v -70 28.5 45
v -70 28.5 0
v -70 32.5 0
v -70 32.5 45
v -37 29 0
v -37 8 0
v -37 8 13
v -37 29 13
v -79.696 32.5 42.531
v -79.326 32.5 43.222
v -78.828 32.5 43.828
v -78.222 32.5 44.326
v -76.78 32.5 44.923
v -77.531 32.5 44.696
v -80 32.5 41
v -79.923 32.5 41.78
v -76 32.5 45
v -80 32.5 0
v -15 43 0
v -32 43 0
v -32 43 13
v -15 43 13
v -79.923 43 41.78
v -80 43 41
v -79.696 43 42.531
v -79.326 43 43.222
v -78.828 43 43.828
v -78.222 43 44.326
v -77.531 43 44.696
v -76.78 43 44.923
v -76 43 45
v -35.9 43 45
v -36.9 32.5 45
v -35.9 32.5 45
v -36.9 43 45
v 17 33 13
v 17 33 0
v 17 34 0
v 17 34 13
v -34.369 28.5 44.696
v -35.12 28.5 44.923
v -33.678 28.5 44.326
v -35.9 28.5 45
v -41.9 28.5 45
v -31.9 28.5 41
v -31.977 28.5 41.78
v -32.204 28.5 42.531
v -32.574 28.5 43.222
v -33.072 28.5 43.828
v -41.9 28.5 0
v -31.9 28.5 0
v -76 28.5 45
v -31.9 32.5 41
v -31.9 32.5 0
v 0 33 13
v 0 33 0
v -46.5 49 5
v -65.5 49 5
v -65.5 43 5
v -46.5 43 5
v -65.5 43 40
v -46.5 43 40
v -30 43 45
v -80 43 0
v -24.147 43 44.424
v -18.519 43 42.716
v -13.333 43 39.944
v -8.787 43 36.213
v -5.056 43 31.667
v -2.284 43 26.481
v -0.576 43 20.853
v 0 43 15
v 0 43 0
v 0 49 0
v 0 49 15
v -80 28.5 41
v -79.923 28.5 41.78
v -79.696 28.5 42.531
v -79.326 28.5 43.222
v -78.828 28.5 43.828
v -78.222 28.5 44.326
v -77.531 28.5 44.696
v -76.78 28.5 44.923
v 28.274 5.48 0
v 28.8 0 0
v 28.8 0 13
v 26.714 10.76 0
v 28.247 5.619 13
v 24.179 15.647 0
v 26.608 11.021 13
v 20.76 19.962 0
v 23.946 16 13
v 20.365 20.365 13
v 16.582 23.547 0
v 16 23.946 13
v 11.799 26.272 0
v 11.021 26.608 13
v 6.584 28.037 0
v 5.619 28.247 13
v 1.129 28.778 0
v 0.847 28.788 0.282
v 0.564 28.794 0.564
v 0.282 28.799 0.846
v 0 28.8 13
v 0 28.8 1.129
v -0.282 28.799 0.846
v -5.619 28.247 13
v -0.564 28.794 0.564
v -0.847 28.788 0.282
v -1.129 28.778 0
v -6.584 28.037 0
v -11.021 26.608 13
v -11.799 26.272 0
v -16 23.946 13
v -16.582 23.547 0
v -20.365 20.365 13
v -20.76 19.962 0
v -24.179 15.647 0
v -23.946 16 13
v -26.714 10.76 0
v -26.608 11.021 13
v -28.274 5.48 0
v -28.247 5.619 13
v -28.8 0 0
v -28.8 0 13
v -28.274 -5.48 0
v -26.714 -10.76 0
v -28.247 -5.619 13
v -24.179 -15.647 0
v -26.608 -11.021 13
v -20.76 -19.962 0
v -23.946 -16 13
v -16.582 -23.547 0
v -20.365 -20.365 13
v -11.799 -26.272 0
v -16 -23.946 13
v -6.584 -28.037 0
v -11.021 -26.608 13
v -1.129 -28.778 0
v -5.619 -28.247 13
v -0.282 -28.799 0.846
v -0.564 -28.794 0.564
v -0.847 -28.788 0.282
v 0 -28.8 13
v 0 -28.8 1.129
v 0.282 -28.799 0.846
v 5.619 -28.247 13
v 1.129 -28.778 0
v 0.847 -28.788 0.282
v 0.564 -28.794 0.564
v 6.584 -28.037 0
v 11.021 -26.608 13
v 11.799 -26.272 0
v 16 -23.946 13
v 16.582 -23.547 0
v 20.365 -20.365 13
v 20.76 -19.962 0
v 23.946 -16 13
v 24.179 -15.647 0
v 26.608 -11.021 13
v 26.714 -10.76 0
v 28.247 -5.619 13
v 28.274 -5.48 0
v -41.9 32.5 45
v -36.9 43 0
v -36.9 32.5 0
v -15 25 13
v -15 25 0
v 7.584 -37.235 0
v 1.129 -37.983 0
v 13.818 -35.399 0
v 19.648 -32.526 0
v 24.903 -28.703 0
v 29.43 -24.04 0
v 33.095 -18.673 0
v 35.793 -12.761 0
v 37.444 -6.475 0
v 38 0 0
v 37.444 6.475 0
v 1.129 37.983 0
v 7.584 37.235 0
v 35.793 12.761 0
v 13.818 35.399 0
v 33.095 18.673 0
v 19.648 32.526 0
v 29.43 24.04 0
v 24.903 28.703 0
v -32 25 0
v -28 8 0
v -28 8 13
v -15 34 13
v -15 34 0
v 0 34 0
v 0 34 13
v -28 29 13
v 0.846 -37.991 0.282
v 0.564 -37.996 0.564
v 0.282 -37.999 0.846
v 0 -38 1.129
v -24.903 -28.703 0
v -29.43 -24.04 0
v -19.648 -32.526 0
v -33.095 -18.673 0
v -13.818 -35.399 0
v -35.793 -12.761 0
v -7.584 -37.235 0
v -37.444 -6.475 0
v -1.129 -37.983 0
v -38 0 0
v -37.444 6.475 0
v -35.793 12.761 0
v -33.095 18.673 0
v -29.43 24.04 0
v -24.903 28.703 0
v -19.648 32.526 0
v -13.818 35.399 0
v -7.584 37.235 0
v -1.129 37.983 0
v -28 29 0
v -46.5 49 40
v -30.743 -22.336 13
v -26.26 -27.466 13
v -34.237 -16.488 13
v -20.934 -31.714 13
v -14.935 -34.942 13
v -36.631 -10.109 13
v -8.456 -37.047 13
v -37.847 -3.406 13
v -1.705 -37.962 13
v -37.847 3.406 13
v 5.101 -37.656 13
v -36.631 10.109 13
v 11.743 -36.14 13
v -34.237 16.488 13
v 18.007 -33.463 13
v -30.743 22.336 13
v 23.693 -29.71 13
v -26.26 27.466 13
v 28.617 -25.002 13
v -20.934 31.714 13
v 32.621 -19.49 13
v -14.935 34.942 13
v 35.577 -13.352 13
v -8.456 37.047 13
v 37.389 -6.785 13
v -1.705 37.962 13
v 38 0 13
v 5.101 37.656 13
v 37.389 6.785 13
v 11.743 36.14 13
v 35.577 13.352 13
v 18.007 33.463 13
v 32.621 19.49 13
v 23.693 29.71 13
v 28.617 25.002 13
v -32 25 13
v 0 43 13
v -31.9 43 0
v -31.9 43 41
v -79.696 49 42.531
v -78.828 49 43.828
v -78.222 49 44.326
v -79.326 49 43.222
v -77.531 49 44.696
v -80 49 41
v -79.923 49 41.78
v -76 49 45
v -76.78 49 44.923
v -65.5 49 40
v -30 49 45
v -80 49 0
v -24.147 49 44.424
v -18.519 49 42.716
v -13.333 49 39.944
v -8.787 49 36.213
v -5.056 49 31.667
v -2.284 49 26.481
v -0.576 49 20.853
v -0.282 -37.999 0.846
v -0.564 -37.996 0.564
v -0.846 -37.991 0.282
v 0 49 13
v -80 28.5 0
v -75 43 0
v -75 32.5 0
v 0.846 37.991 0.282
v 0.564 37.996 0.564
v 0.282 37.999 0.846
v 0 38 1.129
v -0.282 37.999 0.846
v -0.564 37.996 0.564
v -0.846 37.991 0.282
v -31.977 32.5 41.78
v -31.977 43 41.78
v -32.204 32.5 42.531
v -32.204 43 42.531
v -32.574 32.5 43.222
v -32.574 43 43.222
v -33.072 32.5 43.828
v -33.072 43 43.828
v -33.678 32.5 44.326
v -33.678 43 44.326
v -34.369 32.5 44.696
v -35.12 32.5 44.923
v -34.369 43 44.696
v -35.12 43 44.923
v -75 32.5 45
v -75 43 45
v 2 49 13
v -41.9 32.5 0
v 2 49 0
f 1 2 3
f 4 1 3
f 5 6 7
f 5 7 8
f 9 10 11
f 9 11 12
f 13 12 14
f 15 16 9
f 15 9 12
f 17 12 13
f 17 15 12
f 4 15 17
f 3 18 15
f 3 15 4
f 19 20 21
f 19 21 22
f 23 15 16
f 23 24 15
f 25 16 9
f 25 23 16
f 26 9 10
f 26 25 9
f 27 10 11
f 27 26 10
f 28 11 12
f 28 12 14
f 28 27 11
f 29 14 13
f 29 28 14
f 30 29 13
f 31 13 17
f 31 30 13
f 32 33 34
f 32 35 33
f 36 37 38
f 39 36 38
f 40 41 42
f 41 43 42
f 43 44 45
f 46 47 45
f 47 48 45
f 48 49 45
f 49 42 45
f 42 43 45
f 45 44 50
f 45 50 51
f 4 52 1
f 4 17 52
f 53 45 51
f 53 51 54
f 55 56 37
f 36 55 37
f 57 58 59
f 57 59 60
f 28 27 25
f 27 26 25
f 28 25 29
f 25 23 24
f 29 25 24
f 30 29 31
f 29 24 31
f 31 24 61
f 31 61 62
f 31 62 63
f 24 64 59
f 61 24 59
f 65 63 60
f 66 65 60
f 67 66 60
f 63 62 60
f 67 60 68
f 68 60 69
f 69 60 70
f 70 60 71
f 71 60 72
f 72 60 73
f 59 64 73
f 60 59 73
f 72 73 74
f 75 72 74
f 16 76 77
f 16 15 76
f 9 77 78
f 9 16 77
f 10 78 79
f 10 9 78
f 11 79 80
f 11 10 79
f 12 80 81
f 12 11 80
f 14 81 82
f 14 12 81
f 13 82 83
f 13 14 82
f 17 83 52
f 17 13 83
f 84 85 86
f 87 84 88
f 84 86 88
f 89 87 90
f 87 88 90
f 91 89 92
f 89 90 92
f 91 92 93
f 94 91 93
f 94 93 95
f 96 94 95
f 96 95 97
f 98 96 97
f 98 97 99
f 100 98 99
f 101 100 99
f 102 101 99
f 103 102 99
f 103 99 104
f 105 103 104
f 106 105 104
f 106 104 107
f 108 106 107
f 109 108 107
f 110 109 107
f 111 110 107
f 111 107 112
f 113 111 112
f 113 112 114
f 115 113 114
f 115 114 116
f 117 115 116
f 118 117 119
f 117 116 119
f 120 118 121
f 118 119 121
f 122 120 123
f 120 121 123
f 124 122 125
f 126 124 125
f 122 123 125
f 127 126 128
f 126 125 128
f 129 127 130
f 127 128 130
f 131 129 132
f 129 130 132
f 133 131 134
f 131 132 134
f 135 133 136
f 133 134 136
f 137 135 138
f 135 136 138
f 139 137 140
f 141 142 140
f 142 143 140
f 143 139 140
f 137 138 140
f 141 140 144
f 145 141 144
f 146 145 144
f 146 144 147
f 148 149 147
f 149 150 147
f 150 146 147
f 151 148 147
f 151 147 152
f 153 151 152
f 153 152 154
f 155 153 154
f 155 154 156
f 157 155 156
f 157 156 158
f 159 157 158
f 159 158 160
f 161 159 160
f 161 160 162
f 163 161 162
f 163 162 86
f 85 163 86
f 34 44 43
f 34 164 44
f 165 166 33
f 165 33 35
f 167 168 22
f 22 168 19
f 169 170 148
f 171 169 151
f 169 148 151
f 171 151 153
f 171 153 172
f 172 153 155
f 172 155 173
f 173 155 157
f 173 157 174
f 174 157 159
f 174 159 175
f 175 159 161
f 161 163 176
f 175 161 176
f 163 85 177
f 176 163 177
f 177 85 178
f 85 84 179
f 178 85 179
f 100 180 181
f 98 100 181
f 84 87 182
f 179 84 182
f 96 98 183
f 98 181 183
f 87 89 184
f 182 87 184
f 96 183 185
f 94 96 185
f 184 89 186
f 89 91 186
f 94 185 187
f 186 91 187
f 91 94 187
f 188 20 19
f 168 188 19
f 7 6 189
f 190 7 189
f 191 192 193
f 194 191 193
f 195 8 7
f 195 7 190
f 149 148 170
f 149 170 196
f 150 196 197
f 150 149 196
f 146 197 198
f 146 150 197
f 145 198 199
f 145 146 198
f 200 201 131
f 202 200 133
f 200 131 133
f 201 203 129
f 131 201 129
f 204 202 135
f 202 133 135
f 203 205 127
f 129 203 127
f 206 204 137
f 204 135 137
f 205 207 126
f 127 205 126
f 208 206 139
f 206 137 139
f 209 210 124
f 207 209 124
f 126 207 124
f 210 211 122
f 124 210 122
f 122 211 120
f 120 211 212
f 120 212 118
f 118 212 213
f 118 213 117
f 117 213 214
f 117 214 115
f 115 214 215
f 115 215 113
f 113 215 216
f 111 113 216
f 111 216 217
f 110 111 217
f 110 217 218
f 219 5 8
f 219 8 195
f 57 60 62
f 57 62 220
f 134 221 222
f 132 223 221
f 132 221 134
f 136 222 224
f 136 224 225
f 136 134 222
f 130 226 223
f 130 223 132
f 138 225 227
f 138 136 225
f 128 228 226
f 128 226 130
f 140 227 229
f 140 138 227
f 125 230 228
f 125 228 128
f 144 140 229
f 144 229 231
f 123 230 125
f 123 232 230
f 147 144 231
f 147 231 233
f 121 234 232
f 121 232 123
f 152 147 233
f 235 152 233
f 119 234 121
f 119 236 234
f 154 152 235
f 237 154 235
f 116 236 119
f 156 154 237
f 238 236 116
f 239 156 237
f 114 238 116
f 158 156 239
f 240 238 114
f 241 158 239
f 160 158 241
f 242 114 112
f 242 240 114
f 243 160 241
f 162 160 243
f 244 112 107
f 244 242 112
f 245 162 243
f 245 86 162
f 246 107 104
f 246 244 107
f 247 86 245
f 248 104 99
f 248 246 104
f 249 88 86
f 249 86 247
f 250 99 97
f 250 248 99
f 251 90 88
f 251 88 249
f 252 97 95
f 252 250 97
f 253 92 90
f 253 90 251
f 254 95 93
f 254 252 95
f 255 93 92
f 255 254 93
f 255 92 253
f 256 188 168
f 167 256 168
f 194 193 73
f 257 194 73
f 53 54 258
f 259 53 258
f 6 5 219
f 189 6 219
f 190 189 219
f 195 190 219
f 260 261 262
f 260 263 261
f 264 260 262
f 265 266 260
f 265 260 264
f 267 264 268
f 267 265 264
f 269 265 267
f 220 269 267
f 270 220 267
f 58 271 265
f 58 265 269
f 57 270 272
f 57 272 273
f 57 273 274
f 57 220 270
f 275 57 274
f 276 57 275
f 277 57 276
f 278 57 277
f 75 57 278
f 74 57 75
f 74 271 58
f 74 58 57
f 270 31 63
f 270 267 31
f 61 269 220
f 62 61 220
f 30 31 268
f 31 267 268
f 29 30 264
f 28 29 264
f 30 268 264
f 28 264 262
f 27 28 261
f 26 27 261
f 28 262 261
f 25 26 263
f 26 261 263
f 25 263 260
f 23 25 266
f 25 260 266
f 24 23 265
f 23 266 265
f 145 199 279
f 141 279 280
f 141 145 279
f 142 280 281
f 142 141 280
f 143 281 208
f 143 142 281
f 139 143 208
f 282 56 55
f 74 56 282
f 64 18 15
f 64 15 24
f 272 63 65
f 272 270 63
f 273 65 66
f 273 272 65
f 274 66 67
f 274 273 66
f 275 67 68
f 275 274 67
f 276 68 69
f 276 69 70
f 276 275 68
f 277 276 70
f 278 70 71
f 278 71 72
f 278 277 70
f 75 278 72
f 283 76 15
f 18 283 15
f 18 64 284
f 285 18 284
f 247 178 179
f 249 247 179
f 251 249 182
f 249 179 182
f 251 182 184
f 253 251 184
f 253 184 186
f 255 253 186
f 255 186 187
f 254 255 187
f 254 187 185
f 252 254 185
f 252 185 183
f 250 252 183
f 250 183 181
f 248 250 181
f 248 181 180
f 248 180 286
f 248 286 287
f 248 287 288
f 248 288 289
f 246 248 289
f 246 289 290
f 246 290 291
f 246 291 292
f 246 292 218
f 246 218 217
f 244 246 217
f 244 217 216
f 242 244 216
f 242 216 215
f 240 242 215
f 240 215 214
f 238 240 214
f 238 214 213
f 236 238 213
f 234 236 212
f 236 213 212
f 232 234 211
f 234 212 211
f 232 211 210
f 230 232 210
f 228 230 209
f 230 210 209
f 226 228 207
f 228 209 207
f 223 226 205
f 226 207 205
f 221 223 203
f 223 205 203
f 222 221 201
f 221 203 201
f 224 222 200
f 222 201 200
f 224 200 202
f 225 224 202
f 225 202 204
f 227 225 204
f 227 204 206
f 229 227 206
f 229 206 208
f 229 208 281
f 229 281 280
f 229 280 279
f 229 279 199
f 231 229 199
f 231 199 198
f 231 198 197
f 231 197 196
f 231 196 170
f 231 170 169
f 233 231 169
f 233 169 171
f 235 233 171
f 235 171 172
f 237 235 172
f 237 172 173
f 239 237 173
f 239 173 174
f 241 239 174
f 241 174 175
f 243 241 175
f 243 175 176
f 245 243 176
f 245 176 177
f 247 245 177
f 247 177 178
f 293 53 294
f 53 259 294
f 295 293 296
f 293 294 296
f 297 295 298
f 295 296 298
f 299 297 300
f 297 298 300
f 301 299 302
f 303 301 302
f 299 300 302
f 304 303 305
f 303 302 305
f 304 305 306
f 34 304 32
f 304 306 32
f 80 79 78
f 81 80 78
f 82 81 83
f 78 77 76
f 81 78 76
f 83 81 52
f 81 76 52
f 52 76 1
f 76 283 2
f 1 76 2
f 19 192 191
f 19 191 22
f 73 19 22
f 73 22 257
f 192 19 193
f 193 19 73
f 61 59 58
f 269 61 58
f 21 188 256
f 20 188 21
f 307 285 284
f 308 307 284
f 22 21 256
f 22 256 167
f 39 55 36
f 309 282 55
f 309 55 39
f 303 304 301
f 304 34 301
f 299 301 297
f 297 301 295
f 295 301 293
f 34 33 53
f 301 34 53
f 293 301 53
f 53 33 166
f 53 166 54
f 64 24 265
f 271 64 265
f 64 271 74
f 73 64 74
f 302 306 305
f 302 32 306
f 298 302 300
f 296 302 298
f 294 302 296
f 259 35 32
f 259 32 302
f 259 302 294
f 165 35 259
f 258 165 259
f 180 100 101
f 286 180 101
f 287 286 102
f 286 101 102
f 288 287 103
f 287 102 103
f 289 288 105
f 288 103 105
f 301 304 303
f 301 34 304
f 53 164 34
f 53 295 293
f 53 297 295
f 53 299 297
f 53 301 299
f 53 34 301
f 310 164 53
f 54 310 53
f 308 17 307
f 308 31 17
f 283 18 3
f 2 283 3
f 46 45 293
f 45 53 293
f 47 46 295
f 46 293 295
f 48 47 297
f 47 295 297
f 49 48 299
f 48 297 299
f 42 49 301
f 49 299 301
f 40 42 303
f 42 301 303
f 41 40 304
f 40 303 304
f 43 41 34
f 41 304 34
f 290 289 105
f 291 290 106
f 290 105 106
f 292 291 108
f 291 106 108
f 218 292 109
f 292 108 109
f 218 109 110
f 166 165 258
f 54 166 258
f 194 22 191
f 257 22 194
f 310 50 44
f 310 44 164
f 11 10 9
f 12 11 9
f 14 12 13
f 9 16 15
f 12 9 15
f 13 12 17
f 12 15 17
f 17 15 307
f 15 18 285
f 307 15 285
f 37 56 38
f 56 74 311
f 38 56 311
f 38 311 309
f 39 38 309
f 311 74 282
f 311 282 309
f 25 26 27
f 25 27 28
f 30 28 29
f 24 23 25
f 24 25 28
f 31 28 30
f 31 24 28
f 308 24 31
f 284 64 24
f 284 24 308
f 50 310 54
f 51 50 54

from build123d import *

# Parameters (mm, degrees)
SKETCH_R             = 38
PAD_DEPTH            = 13
SKETCH001_R          = 28.8
POCKET_DEPTH         = 13.001
POCKET001_DEPTH      = 38.001
POCKET001_DEPTH_BACK = 38.001
BOX005_W             = 15
BOX005_H             = 9
BOX005_DEPTH         = 13
BOX007_W             = 17
BOX007_H             = 18
BOX007_DEPTH         = 13
BOX008_W             = 9
BOX008_H             = 21
BOX008_DEPTH         = 13
BOX006_W             = 17
BOX006_H             = 16
BOX006_DEPTH         = 13
CHAMFER_SIZE         = 15
BOX009_W             = 19
BOX009_H             = 6
BOX009_DEPTH         = 35
BOX_W                = 80
BOX_H                = 6
BOX_DEPTH            = 45
FILLET_R             = 30
FILLET001_R          = 4
BOX001_W             = 5
BOX001_H             = 10.5
BOX001_DEPTH         = 45
FILLET002_R          = 4
BOX002_W             = 10
BOX002_H             = 4
BOX002_DEPTH         = 45
FILLET003_R          = 4
BOX003_W             = 5
BOX003_H             = 10.5
BOX003_DEPTH         = 45
FILLET004_R          = 4
BOX004_W             = 10
BOX004_H             = 4
BOX004_DEPTH         = 45
FILLET005_R          = 4


with BuildPart() as body:
    # Sketch → Pad (new body)
    with BuildSketch(Plane.XY):
        Circle(SKETCH_R)
    extrude(amount=PAD_DEPTH)

    # Sketch001 (on Face3 of Pad) → Pocket (cut, through all)
    with BuildSketch(Plane.XY.offset(13)):
        Circle(SKETCH001_R)
    extrude(amount=-POCKET_DEPTH, mode=Mode.SUBTRACT)

    # Sketch004 → Pocket001 (cut, two sides)
    with BuildSketch(Plane.XZ) as pocket001_sk:
        Polygon((1.5, -0.371425), (0, 1.128575), (-1.5, -0.371425), align=None)
    extrude(amount=POCKET001_DEPTH, mode=Mode.SUBTRACT)
    extrude(pocket001_sk.sketch, amount=-POCKET001_DEPTH_BACK, mode=Mode.SUBTRACT)


with BuildPart() as cube005:
    # Box005 → Box005 (new body)
    with BuildSketch(Plane(origin=(-15, 34, 0), x_dir=(1, 0, 0), z_dir=(0, 0, 1))):
        with Locations((7.5, 4.5)):
            Rectangle(BOX005_W, BOX005_H)
    extrude(amount=BOX005_DEPTH)


with BuildPart() as cube007:
    # Box007 → Box007 (new body)
    with BuildSketch(Plane(origin=(-32, 25, 0), x_dir=(1, 0, 0), z_dir=(0, 0, 1))):
        with Locations((8.5, 9)):
            Rectangle(BOX007_W, BOX007_H)
    extrude(amount=BOX007_DEPTH)


with BuildPart() as cube008:
    # Box008 → Box008 (new body)
    with BuildSketch(Plane(origin=(-37, 8, 0), x_dir=(1, 0, 0), z_dir=(0, 0, 1))):
        with Locations((4.5, 10.5)):
            Rectangle(BOX008_W, BOX008_H)
    extrude(amount=BOX008_DEPTH)


with BuildPart() as chamfer_body:
    # Box006 → Box006 (new body)
    with BuildSketch(Plane(origin=(0, 33, 0), x_dir=(1, 0, 0), z_dir=(0, 0, 1))):
        with Locations((8.5, 8)):
            Rectangle(BOX006_W, BOX006_H)
    extrude(amount=BOX006_DEPTH)

    # Chamfer
    chamfer_edges = [chamfer_body.edges().sort_by_distance(p)[0] for p in [
        (17, 49, 6.5),
    ]]
    chamfer(chamfer_edges, length=CHAMFER_SIZE)


with BuildPart() as cube009:
    # Box009 → Box009 (new body)
    with BuildSketch(Plane(origin=(-65.5, 34, 5), x_dir=(1, 0, 0), z_dir=(0, 0, 1))):
        with Locations((9.5, 3)):
            Rectangle(BOX009_W, BOX009_H)
    extrude(amount=BOX009_DEPTH)


with BuildPart() as fillet001:
    # Box → Box (new body)
    with BuildSketch(Plane(origin=(-80, 34, 0), x_dir=(1, 0, 0), z_dir=(0, 0, 1))):
        with Locations((40, 3)):
            Rectangle(BOX_W, BOX_H)
    extrude(amount=BOX_DEPTH)

    # Cut: cut Cube009
    add(cube009.part, mode=Mode.SUBTRACT)


with BuildPart() as fillet001_1:
    # Cut placement: moved
    add(fillet001.part.moved(Location((0, 9, 0))))

    # Fillet
    fillet_edges = [fillet001_1.edges().sort_by_distance(p)[0] for p in [
        (0, 46, 45),
    ]]
    fillet(fillet_edges, radius=FILLET_R)

    # Fillet001
    fillet001_edges = [fillet001_1.edges().sort_by_distance(p)[0] for p in [
        (-80, 46, 45),
    ]]
    fillet(fillet001_edges, radius=FILLET001_R)


with BuildPart() as fillet002:
    # Box001 → Box001 (new body)
    with BuildSketch(Plane(origin=(-80, 32.5, 0), x_dir=(1, 0, 0), z_dir=(0, 0, 1))):
        with Locations((2.5, 5.25)):
            Rectangle(BOX001_W, BOX001_H)
    extrude(amount=BOX001_DEPTH)

    # Fillet002
    fillet002_edges = [fillet002.edges().sort_by_distance(p)[0] for p in [
        (-80, 37.75, 45),
    ]]
    fillet(fillet002_edges, radius=FILLET002_R)


with BuildPart() as fillet003:
    # Box002 → Box002 (new body)
    with BuildSketch(Plane(origin=(-80, 28.5, 0), x_dir=(1, 0, 0), z_dir=(0, 0, 1))):
        with Locations((5, 2)):
            Rectangle(BOX002_W, BOX002_H)
    extrude(amount=BOX002_DEPTH)

    # Fillet003
    fillet003_edges = [fillet003.edges().sort_by_distance(p)[0] for p in [
        (-80, 30.5, 45),
    ]]
    fillet(fillet003_edges, radius=FILLET003_R)


with BuildPart() as fillet004:
    # Box003 → Box003 (new body)
    with BuildSketch(Plane(origin=(-36.9, 32.5, 0), x_dir=(1, 0, 0), z_dir=(0, 0, 1))):
        with Locations((2.5, 5.25)):
            Rectangle(BOX003_W, BOX003_H)
    extrude(amount=BOX003_DEPTH)

    # Fillet004
    fillet004_edges = [fillet004.edges().sort_by_distance(p)[0] for p in [
        (-31.9, 37.75, 45),
    ]]
    fillet(fillet004_edges, radius=FILLET004_R)


with BuildPart() as fillet005:
    # Box004 → Box004 (new body)
    with BuildSketch(Plane(origin=(-41.9, 28.5, 0), x_dir=(1, 0, 0), z_dir=(0, 0, 1))):
        with Locations((5, 2)):
            Rectangle(BOX004_W, BOX004_H)
    extrude(amount=BOX004_DEPTH)

    # Fillet005
    fillet005_edges = [fillet005.edges().sort_by_distance(p)[0] for p in [
        (-31.9, 30.5, 45),
    ]]
    fillet(fillet005_edges, radius=FILLET005_R)


solid = Compound([body.part, cube005.part, cube007.part, cube008.part, chamfer_body.part, fillet001_1.part, fillet002.part, fillet003.part, fillet004.part, fillet005.part])
